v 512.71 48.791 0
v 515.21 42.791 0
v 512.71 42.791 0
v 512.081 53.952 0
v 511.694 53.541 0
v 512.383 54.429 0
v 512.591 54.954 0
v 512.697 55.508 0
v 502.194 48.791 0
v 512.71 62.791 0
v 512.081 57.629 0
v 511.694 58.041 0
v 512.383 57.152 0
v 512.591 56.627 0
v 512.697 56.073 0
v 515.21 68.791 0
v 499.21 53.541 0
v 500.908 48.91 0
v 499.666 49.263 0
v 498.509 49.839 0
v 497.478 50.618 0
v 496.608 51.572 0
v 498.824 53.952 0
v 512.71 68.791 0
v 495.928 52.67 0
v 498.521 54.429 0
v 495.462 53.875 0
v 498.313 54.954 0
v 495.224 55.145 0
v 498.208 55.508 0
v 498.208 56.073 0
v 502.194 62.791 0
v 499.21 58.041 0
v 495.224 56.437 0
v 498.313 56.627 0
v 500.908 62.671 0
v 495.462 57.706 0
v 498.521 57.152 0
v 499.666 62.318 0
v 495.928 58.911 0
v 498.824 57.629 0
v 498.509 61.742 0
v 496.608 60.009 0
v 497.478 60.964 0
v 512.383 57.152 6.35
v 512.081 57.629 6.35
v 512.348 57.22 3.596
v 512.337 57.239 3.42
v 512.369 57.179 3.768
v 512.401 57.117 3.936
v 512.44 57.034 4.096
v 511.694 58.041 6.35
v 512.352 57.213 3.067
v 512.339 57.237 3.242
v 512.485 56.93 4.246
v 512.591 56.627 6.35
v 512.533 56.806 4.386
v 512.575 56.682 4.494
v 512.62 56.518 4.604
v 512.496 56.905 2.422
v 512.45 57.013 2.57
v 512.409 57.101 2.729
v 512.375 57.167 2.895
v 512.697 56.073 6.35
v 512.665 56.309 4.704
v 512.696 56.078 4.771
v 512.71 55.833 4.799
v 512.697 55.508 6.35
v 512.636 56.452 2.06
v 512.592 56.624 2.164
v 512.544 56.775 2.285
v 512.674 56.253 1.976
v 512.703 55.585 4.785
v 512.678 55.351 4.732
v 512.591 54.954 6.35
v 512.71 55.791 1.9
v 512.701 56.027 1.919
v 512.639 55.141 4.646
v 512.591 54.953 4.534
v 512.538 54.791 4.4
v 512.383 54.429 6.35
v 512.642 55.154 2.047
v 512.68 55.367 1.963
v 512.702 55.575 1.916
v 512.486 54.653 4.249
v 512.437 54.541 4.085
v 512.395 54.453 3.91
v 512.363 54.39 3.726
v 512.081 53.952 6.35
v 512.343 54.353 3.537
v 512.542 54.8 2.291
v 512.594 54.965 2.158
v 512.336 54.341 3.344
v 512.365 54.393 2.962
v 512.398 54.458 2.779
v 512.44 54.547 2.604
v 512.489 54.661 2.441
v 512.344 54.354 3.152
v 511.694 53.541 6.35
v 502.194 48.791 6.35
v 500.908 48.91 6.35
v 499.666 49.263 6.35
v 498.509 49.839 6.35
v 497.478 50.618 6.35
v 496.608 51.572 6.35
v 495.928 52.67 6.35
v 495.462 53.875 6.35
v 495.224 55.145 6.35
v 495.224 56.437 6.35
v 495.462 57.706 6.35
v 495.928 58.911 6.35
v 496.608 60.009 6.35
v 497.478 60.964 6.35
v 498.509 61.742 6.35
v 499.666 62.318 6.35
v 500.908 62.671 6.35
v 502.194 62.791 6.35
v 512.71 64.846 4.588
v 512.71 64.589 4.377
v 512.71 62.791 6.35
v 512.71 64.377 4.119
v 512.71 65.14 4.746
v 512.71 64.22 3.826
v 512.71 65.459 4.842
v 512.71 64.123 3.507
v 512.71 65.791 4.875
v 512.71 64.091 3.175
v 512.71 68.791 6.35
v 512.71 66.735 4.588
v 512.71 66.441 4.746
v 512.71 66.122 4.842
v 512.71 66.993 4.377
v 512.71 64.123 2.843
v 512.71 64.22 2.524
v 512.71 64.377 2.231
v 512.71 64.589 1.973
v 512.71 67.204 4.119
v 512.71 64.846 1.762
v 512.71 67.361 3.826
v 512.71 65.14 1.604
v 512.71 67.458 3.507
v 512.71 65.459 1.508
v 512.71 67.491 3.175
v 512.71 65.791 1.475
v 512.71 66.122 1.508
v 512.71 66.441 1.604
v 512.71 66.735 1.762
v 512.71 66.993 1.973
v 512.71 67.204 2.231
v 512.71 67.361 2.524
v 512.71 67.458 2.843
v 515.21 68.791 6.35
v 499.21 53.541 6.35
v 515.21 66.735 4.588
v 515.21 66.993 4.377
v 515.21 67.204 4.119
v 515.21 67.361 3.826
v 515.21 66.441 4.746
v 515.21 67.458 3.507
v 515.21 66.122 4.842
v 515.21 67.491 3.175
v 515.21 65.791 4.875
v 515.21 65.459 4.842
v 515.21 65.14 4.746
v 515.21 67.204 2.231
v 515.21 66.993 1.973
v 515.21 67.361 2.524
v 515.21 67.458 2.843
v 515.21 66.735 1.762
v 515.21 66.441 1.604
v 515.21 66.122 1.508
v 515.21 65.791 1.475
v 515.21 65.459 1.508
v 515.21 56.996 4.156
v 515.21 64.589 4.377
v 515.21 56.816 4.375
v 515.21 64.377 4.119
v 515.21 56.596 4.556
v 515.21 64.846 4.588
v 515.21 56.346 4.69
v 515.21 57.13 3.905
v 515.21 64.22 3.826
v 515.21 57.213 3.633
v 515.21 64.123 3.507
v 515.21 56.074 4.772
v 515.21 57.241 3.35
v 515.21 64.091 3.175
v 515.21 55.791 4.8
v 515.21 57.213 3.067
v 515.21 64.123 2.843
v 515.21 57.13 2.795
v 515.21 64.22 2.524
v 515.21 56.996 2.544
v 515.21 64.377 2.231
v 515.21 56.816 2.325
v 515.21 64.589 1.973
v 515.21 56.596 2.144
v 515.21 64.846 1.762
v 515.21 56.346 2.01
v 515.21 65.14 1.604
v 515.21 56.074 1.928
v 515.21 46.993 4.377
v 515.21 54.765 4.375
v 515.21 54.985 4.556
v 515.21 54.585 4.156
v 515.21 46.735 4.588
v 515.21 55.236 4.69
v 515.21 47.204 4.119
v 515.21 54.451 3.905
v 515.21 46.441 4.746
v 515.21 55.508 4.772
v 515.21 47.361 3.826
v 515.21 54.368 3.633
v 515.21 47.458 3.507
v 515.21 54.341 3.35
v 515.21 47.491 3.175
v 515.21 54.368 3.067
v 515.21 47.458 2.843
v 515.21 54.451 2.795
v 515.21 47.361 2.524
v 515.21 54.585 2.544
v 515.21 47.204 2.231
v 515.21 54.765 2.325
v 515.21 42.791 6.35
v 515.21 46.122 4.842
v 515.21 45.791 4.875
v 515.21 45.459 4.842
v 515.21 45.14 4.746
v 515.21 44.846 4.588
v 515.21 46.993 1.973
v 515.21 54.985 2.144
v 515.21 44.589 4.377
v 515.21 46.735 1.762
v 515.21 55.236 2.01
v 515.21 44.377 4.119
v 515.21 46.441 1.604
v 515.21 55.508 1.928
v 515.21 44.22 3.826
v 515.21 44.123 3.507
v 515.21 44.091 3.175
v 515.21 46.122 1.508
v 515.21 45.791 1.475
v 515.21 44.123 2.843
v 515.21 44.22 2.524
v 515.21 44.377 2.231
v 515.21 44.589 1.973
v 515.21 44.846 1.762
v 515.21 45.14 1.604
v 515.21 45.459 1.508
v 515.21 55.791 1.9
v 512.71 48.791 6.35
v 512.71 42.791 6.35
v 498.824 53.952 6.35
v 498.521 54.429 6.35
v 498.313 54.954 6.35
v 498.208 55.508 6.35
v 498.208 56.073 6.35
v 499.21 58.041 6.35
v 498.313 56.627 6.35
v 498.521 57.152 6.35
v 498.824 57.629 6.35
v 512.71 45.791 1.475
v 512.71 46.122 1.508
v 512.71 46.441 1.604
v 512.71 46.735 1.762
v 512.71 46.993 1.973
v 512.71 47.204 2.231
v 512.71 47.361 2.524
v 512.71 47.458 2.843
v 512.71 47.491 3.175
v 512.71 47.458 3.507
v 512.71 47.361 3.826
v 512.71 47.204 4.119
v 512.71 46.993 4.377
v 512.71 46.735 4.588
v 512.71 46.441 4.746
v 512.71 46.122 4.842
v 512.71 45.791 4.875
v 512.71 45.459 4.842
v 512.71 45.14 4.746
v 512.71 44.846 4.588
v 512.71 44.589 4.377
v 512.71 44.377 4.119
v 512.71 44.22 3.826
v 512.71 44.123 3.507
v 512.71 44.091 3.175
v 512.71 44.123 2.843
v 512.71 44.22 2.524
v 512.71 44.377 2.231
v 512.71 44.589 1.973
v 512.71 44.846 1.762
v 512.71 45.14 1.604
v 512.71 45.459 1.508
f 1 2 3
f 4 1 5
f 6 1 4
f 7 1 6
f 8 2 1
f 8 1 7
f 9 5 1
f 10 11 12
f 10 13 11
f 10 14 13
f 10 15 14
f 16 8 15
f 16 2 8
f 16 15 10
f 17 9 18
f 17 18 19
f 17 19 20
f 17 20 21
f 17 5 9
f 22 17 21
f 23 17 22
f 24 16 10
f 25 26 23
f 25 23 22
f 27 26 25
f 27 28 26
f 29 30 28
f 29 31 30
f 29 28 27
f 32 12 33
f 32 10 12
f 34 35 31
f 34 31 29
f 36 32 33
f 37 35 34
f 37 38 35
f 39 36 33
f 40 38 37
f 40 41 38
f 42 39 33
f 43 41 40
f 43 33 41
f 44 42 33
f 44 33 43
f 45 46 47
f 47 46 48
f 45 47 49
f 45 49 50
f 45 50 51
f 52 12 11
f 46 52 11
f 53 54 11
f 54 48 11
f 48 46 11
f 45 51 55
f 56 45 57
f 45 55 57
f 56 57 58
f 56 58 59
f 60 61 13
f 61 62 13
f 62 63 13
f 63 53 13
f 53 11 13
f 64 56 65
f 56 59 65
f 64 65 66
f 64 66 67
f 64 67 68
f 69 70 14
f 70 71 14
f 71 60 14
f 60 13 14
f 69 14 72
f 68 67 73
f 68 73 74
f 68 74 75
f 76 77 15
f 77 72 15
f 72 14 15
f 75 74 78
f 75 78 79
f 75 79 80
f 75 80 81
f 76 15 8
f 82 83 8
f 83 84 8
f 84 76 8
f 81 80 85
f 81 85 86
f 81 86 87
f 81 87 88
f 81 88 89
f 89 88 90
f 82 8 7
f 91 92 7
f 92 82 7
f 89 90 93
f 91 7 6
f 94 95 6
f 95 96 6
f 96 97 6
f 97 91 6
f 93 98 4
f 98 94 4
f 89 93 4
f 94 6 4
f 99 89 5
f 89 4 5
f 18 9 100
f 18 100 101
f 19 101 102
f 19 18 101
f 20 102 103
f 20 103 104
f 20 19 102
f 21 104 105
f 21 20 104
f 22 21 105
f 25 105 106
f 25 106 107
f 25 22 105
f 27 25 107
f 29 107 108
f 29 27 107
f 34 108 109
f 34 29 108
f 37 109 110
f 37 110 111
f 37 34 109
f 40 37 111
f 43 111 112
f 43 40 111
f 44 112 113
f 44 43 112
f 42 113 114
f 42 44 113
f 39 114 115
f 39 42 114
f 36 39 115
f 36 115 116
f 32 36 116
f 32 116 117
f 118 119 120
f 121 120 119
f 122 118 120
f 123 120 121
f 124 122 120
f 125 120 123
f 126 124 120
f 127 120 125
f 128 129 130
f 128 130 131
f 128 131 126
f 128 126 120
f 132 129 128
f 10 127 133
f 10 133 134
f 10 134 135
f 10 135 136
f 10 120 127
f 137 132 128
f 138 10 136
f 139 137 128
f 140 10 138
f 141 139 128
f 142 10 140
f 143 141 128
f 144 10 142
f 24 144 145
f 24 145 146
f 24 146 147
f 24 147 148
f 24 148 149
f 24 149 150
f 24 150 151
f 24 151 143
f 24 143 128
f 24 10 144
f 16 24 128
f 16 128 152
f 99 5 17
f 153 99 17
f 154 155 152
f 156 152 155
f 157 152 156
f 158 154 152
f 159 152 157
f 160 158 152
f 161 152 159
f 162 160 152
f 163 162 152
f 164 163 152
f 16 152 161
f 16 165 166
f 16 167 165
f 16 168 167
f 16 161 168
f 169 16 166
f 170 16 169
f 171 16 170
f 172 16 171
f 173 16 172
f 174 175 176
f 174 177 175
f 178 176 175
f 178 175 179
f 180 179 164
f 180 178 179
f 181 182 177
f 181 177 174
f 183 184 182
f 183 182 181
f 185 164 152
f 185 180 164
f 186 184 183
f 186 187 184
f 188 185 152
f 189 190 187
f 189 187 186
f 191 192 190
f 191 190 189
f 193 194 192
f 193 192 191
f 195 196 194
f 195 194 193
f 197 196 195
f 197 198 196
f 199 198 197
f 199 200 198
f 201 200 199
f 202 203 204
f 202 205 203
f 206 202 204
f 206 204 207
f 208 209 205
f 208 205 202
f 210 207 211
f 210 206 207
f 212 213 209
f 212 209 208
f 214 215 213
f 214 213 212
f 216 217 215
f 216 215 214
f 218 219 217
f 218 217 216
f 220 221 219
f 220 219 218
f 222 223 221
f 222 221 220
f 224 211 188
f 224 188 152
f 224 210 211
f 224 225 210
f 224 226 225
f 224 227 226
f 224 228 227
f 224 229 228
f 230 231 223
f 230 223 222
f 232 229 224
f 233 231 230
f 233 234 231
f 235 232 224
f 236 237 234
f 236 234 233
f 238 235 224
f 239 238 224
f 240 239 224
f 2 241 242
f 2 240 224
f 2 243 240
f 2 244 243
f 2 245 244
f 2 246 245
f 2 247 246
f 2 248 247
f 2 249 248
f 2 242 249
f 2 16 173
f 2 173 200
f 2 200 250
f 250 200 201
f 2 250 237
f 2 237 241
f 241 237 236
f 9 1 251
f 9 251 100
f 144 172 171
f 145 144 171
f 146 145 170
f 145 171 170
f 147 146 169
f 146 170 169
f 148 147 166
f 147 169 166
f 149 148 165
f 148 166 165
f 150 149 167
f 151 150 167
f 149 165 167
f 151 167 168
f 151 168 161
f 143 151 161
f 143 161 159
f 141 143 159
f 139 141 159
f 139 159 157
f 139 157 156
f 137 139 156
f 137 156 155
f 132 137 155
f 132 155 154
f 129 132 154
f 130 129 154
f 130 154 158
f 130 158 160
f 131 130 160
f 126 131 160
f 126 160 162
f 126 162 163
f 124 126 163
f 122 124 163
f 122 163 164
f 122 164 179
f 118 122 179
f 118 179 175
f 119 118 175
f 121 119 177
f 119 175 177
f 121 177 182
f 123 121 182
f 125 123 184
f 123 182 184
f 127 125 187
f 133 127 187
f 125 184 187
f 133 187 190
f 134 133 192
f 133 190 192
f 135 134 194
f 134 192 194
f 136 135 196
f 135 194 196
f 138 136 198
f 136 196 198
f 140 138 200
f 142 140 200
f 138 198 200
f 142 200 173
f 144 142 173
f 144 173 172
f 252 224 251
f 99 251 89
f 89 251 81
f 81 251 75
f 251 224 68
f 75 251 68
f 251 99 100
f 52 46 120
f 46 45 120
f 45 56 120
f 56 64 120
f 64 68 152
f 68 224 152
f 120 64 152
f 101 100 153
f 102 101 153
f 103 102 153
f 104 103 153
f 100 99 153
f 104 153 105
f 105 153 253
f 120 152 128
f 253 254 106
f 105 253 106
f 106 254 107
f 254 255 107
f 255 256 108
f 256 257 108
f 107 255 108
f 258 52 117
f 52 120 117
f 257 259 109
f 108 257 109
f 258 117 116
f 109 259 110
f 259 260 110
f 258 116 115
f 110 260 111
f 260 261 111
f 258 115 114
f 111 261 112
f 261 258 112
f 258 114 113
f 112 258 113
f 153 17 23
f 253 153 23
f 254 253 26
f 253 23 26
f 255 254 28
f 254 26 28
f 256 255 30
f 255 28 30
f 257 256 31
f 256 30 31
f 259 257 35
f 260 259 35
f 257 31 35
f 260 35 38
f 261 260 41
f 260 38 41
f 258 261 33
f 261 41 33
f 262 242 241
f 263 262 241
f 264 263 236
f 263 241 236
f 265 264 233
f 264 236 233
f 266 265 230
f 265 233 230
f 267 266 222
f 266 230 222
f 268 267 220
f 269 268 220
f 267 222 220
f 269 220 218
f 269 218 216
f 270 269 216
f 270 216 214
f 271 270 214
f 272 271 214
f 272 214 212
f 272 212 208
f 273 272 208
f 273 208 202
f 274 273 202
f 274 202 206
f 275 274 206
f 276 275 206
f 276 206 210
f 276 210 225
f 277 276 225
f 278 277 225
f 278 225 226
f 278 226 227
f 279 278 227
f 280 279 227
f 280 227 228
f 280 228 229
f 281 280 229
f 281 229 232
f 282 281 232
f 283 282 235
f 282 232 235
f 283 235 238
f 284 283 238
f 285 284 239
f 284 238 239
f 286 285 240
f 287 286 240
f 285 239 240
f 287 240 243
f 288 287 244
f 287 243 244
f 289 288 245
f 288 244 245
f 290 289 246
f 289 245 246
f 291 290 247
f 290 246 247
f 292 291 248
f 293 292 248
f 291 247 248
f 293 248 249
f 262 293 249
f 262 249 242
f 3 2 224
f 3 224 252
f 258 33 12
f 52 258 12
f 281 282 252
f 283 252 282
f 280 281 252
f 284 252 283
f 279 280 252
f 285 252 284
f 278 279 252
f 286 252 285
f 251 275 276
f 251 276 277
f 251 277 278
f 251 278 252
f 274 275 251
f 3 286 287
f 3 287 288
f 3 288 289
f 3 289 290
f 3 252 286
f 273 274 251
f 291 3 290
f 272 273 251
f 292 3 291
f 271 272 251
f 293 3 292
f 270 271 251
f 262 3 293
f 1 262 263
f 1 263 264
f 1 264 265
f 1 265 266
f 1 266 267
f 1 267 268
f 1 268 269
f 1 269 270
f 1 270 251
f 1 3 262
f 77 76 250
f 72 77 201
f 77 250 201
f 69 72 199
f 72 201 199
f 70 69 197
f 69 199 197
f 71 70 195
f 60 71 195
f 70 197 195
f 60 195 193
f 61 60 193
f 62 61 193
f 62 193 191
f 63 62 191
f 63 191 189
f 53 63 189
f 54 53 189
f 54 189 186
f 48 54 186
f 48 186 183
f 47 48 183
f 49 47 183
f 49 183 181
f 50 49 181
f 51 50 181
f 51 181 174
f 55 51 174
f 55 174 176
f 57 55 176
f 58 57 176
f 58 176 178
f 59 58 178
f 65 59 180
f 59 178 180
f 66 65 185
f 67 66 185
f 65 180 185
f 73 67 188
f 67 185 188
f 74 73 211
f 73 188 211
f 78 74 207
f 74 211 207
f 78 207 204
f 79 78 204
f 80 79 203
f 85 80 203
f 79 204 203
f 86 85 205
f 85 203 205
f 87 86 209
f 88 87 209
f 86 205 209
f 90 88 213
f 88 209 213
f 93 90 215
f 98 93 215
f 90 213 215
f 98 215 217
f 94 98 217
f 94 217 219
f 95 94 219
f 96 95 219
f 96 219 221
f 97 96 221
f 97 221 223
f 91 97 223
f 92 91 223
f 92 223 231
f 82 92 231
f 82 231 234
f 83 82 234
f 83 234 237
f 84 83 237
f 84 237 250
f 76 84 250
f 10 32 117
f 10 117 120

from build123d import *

# Parameters (mm, degrees)
BOSS_EXTRUDE1_DEPTH = 6.35
CUT_EXTRUDE1_REACH  = 22.016
SKETCH2_R           = 1.7
SKETCH2_R_2         = 1.45


with BuildPart() as part:
    # Sketch1 → Boss-Extrude1 (new body)
    with BuildSketch(Plane.XY):
        with BuildLine():
            Line((515.21, 42.790633073), (512.71, 42.790633073))
            Line((512.71, 42.790633073), (512.71, 48.790633073))
            Line((512.71, 48.790633073), (502.194313483, 48.790633073))
            ThreePointArc((502.194313483, 48.790633073), (495.194313483, 55.790633073), (502.194313483, 62.790633073))
            Line((502.194313483, 62.790633073), (512.71, 62.790633073))
            Line((512.71, 62.790633073), (512.71, 68.790633073))
            Line((512.71, 68.790633073), (515.21, 68.790633073))
            Line((515.21, 68.790633073), (515.21, 42.790633073))
        make_face()
        with BuildLine():
            Line((511.694313483, 53.540633073), (499.21, 53.540633073))
            ThreePointArc((499.21, 53.540633073), (498.194313483, 55.790633073), (499.21, 58.040633073))
            Line((499.21, 58.040633073), (511.694313483, 58.040633073))
            ThreePointArc((511.694313483, 58.040633073), (512.71, 55.790633073), (511.694313483, 53.540633073))
        make_face(mode=Mode.SUBTRACT)
    extrude(amount=BOSS_EXTRUDE1_DEPTH)

    # Sketch2 → Cut-Extrude1 (cut, up to next)
    with BuildSketch(Plane(origin=(515.21, 0, 0), x_dir=(0, 0, -1), z_dir=(1, 0, 0)), mode=Mode.PRIVATE) as cut_extrude1_sk1:
        with Locations((-3.175, 45.790633073)):
            Circle(SKETCH2_R)
    cut_extrude1_tool1 = extrude(cut_extrude1_sk1.sketch, amount=-CUT_EXTRUDE1_REACH, mode=Mode.PRIVATE) & part.part
    add(cut_extrude1_tool1.solids().sort_by_distance((515.21, 45.790633, 3.175))[0], mode=Mode.SUBTRACT)
    # Sketch2 → Cut-Extrude1 (cut, up to next)
    with BuildSketch(Plane(origin=(515.21, 0, 0), x_dir=(0, 0, -1), z_dir=(1, 0, 0)), mode=Mode.PRIVATE) as cut_extrude1_sk2:
        with Locations((-3.35, 55.790633073)):
            Circle(SKETCH2_R_2)
    cut_extrude1_tool2 = extrude(cut_extrude1_sk2.sketch, amount=-CUT_EXTRUDE1_REACH, mode=Mode.PRIVATE) & part.part
    add(cut_extrude1_tool2.solids().sort_by_distance((515.21, 55.790633, 3.35))[0], mode=Mode.SUBTRACT)
    # Sketch2 → Cut-Extrude1 (cut, up to next)
    with BuildSketch(Plane(origin=(515.21, 0, 0), x_dir=(0, 0, -1), z_dir=(1, 0, 0)), mode=Mode.PRIVATE) as cut_extrude1_sk3:
        with Locations((-3.175, 65.790633073)):
            Circle(SKETCH2_R)
    cut_extrude1_tool3 = extrude(cut_extrude1_sk3.sketch, amount=-CUT_EXTRUDE1_REACH, mode=Mode.PRIVATE) & part.part
    add(cut_extrude1_tool3.solids().sort_by_distance((515.21, 65.790633, 3.175))[0], mode=Mode.SUBTRACT)


solid = part.part
